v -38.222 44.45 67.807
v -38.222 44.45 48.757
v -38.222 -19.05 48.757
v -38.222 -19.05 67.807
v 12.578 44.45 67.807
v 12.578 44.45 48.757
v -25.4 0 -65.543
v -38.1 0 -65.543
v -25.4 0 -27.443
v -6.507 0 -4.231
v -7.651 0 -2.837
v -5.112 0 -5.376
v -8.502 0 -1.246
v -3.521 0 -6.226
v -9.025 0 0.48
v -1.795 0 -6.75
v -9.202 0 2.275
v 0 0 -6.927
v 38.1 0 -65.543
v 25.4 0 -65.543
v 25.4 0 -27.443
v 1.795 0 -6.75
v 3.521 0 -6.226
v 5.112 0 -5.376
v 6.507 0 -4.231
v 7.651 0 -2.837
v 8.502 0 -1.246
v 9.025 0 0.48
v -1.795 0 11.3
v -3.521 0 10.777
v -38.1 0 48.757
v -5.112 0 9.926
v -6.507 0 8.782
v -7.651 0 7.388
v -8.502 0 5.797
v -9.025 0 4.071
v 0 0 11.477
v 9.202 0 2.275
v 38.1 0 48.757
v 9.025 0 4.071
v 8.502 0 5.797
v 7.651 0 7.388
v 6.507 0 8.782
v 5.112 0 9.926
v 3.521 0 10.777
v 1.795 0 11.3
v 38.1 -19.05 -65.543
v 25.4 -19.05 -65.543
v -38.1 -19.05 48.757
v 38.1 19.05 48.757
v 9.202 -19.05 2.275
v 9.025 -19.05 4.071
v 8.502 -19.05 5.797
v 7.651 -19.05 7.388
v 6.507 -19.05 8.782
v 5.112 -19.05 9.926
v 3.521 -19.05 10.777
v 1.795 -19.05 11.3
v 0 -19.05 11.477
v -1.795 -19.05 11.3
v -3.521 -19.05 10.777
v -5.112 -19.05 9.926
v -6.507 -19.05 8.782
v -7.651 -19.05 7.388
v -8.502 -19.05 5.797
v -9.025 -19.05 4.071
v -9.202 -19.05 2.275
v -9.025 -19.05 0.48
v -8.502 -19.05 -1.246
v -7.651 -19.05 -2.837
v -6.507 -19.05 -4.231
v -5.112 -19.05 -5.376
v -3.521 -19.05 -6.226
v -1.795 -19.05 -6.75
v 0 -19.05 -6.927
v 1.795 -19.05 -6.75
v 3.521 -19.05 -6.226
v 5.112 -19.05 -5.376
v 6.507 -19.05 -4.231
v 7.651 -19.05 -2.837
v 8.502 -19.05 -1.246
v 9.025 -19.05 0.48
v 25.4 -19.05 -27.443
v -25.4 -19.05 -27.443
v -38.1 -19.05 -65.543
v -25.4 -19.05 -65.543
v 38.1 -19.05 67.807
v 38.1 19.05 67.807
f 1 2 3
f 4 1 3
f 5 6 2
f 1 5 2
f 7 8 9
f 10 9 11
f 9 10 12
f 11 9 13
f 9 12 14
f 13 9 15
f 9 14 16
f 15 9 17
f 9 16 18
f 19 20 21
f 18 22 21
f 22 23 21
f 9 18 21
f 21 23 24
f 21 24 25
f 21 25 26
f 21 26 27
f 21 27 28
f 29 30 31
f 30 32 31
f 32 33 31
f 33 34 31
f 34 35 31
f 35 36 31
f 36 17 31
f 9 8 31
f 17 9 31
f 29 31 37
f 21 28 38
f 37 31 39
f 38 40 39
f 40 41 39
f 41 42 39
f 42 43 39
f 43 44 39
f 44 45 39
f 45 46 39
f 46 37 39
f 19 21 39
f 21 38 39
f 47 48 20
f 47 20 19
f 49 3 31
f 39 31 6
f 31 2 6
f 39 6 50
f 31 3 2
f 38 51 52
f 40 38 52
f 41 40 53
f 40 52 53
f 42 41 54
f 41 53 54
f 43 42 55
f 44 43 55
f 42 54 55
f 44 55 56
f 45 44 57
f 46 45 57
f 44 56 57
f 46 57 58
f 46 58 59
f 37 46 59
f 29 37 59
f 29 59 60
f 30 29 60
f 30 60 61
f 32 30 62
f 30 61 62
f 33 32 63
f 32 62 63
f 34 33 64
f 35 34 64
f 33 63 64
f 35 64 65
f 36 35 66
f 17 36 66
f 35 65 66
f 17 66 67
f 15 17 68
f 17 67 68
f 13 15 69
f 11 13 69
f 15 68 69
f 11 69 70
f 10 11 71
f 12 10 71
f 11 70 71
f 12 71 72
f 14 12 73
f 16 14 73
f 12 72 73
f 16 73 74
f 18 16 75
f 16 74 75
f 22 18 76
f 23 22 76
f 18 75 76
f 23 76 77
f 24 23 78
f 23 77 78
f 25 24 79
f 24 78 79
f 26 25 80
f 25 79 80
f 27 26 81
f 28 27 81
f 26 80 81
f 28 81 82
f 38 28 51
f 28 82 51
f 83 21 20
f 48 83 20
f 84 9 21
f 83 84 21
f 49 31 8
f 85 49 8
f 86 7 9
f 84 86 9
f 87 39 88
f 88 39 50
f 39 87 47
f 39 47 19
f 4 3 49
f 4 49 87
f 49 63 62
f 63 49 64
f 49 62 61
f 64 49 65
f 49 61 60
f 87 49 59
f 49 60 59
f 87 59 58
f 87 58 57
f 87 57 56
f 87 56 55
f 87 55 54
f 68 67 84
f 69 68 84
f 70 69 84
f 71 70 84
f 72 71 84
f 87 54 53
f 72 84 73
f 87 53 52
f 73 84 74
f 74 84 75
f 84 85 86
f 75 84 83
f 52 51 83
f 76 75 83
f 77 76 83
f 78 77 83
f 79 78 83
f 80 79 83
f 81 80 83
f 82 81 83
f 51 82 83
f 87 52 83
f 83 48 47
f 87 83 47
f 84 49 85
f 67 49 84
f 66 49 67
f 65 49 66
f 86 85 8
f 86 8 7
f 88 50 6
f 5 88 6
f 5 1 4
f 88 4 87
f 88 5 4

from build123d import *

# Parameters (mm, degrees)
F1_DEPTH = 19.05
F2_R     = 9.20198
F3_DEPTH = 19.05
F5_DEPTH = 19.05


with BuildPart() as f1:
    # F0 (on Front) → F1 (new body)
    with BuildSketch(Plane.XZ):
        Polygon((38.1, 48.757284), (-38.1, 48.757284), (-38.1, -65.542716), (-25.4, -65.542716), (-25.4, -27.442716), (25.4, -27.442716), (25.4, -65.542716), (38.1, -65.542716), align=None)
    extrude(amount=F1_DEPTH)

    # F2 (on face) → F3 (cut)
    with BuildSketch(Plane.XZ.offset(19.05)):
        with Locations((0, 2.275284)):
            Circle(F2_R)
    extrude(amount=-F3_DEPTH, mode=Mode.SUBTRACT)

    # F4 (on face) → F5 (join)
    with BuildSketch(Plane.XY.offset(48.757284)):
        Polygon((-38.222246, 44.45), (-38.222246, -19.05), (38.1, -19.05), (38.1, 19.05), (12.577754, 44.45), align=None)
    extrude(amount=F5_DEPTH)


solid = f1.part
